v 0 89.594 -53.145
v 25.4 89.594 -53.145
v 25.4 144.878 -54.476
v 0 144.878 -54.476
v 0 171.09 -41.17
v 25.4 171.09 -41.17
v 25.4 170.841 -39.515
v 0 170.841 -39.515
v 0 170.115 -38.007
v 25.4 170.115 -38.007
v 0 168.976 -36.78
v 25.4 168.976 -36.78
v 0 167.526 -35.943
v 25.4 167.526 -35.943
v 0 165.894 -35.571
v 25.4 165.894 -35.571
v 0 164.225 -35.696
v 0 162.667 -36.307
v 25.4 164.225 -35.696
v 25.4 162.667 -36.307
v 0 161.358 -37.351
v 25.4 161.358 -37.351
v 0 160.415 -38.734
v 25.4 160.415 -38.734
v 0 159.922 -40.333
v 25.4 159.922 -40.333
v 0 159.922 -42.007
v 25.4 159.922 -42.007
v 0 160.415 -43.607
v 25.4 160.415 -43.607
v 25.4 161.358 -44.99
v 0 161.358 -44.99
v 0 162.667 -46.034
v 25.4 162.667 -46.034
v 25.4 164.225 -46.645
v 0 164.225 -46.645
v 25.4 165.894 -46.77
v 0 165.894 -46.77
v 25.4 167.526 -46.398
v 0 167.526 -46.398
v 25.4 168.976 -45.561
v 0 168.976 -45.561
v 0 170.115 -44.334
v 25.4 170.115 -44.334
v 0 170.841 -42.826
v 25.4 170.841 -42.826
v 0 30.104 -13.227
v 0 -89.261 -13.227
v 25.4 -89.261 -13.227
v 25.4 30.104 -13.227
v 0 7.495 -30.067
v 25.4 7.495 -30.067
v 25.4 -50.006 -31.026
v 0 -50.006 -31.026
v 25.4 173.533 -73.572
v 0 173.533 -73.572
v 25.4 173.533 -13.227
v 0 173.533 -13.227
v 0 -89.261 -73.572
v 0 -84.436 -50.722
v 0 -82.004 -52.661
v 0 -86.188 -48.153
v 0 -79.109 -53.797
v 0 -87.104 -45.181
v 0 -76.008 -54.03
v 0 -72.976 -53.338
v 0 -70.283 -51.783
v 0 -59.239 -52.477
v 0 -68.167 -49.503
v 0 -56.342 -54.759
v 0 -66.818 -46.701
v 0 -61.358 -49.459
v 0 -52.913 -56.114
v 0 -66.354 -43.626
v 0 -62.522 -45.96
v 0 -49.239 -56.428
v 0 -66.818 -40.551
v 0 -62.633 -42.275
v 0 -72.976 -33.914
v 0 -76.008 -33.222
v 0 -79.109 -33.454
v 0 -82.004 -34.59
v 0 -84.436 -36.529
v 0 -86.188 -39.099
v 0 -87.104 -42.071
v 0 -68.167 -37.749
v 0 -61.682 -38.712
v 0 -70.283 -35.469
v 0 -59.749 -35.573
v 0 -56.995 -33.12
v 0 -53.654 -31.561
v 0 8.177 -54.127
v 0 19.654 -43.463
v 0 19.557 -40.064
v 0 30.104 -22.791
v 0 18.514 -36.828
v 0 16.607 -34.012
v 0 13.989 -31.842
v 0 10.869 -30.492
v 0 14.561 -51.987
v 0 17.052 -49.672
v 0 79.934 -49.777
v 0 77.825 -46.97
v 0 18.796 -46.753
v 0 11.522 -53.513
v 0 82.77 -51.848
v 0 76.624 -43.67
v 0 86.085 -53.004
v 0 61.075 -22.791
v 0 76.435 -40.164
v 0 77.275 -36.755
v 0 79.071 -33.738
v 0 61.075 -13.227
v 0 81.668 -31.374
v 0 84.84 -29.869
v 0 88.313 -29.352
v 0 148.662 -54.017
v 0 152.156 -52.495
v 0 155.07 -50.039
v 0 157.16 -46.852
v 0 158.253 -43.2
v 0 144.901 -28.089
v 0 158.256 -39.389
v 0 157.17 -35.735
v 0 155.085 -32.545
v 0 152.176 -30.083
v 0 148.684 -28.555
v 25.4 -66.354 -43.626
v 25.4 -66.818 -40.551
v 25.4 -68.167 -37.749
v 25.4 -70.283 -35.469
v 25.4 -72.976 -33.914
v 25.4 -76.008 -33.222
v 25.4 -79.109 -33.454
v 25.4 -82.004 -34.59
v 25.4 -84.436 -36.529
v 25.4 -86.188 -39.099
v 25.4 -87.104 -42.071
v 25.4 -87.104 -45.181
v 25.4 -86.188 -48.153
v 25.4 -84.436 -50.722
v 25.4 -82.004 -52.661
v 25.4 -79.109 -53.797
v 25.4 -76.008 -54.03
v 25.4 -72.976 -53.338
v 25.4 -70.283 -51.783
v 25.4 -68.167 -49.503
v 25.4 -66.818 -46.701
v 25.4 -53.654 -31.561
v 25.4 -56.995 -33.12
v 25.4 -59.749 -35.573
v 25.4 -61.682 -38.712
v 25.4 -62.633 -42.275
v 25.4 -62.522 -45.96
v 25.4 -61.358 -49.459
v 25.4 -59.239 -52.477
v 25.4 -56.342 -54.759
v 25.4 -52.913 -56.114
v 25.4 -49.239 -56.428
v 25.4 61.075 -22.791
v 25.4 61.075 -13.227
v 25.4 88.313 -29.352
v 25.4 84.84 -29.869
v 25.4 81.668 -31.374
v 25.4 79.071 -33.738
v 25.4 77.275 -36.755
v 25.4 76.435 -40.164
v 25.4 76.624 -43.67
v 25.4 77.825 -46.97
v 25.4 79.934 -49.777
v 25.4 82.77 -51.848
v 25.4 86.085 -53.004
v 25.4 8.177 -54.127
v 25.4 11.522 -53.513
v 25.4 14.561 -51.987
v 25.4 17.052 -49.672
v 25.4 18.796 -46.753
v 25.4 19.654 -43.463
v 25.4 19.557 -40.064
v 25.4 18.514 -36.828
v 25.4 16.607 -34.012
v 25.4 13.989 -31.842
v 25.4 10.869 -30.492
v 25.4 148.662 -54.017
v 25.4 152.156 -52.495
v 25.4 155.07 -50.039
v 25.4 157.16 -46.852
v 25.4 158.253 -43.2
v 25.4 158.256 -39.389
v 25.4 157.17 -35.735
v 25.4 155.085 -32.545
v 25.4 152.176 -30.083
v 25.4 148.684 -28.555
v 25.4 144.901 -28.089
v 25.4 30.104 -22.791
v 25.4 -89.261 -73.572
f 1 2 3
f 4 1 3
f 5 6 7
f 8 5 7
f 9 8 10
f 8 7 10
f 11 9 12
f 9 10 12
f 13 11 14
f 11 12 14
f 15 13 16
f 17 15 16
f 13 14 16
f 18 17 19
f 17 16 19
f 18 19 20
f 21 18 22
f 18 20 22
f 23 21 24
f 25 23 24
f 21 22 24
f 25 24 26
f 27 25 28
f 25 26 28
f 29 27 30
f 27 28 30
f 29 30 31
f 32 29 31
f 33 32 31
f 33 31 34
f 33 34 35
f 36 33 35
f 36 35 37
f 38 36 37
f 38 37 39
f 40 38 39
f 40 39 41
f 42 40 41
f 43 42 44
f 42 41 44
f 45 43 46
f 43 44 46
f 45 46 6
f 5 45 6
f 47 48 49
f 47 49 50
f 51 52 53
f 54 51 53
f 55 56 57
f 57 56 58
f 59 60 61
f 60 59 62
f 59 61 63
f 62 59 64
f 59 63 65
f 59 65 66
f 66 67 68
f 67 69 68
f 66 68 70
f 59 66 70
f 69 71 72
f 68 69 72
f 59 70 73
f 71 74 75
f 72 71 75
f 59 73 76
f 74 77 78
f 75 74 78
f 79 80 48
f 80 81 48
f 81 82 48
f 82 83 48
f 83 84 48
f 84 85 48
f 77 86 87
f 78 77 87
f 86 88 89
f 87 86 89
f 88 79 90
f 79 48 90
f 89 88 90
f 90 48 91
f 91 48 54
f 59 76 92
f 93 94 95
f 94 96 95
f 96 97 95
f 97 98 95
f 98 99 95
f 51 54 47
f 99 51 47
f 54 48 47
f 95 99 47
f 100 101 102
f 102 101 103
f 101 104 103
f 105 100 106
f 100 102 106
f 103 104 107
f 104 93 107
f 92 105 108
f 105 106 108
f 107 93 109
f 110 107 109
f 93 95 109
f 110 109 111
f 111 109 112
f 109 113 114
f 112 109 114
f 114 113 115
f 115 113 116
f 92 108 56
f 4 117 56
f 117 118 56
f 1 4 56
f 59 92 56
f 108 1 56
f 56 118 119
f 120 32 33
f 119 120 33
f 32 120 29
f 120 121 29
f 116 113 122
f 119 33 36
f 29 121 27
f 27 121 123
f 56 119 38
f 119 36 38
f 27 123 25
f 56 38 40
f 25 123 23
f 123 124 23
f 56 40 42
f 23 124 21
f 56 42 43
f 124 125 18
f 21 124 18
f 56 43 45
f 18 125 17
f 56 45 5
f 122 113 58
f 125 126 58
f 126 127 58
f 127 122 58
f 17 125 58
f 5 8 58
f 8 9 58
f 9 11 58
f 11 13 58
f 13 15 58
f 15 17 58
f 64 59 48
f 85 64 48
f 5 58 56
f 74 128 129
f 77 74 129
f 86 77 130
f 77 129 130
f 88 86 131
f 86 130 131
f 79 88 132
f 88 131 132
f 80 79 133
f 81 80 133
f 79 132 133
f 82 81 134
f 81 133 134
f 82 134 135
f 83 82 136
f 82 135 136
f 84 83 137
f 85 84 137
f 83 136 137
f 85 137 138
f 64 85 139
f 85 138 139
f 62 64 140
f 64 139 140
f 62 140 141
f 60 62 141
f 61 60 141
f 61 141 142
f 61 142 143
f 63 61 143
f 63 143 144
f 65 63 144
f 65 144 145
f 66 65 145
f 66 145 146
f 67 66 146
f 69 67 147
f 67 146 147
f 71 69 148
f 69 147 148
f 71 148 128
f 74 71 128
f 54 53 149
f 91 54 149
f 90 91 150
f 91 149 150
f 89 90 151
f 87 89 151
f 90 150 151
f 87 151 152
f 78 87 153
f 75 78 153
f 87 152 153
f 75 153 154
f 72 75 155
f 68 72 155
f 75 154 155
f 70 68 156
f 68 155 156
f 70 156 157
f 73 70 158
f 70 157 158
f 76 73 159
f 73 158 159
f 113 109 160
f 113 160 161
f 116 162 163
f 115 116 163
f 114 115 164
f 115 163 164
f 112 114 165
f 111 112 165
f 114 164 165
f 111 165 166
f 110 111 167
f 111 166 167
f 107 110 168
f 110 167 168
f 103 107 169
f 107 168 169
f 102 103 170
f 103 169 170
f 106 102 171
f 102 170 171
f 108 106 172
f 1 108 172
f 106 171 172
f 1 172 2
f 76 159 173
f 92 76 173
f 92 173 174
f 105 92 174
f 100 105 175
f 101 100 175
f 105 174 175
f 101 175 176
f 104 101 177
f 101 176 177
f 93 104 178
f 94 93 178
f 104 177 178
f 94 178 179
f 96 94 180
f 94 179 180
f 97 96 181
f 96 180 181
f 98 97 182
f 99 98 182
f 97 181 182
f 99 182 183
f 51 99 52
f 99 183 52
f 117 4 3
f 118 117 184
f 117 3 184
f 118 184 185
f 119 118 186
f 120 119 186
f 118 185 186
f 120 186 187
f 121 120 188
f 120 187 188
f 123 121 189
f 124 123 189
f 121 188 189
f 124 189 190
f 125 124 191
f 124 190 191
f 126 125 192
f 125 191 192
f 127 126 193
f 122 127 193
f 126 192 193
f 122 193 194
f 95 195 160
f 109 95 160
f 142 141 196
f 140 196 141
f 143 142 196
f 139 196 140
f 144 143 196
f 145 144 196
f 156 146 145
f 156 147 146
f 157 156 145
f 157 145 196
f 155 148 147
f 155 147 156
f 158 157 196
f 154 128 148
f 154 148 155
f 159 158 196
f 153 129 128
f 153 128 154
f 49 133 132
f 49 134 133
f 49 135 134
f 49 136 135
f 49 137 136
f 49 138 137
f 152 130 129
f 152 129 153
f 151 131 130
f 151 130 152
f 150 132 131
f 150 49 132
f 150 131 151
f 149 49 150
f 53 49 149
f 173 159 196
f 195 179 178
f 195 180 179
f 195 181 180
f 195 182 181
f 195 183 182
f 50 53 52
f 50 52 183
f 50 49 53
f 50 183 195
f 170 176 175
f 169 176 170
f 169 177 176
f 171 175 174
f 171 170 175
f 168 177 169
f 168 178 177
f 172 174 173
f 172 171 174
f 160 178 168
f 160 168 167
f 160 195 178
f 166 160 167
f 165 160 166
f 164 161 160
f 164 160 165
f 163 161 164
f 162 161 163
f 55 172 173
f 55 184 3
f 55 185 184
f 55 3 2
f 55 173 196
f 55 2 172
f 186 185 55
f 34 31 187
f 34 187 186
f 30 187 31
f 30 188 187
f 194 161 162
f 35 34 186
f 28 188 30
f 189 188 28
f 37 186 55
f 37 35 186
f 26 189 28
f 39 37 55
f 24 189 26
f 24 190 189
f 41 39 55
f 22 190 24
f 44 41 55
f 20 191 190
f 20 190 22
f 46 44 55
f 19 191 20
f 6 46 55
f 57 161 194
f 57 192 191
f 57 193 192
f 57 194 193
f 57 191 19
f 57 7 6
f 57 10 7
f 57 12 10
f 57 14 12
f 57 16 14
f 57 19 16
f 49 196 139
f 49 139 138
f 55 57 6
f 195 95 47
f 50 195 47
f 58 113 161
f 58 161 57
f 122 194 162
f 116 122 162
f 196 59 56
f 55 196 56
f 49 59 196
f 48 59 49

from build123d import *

# Parameters (mm, degrees)
F0_W     = 262.7939805388
F0_H     = 60.3452790529
F1_DEPTH = 25.4
F3_DEPTH = 25.4
F4_W     = 30.9705659747
F4_H     = 9.5640197396
F5_DEPTH = 25.4
F6_R     = 10.4332897986
F6_R_2   = 5.6156262259
F7_DEPTH = 25.4


with BuildPart() as f1:
    # F0 (on Right) → F1 (new body)
    with BuildSketch(Plane.YZ):
        with Locations((42.1361811459, -43.3992138132)):
            Rectangle(F0_W, F0_H)
    extrude(amount=F1_DEPTH)

    # F2 (on face) → F3 (cut)
    with BuildSketch(Plane.YZ.offset(25.4)):
        with BuildLine():
            Line((7.4948265063, -30.0673552864), (-50.0055514276, -31.0259021828))
            ThreePointArc((-50.0055514276, -31.0259021828), (-62.7121802874, -44.1216826763), (-49.2391608491, -56.4276012088))
            Line((-49.2391608491, -56.4276012088), (8.1772062662, -54.1274810899))
            ThreePointArc((8.1772062662, -54.1274810899), (19.7263216343, -41.7601920363), (7.4948265063, -30.0673552864))
        make_face()
        with BuildLine():
            Line((144.9011948523, -28.0890673087), (88.3131250739, -29.3520299082))
            ThreePointArc((88.3131250739, -29.3520299082), (76.3994481978, -41.9242015804), (89.5937708362, -53.1449434175))
            Line((89.5937708362, -53.1449434175), (144.8779408269, -54.4762968558))
            ThreePointArc((144.8779408269, -54.4762968558), (158.3928280128, -41.2945819732), (144.9011948523, -28.0890673087))
        make_face()
    extrude(amount=-F3_DEPTH, mode=Mode.SUBTRACT)

    # F4 (on face) → F5 (cut)
    with BuildSketch(Plane.YZ.offset(25.4)):
        with Locations((45.589402318, -18.0085841566)):
            Rectangle(F4_W, F4_H)
    extrude(amount=-F5_DEPTH, mode=Mode.SUBTRACT)

    # F6 (on face) → F7 (cut)
    with BuildSketch(Plane.YZ.offset(25.4)):
        with Locations((-76.7875984311, -43.6257906258)):
            Circle(F6_R)
        with Locations((165.4747128487, -41.1704294384)):
            Circle(F6_R_2)
    extrude(amount=-F7_DEPTH, mode=Mode.SUBTRACT)


solid = f1.part
